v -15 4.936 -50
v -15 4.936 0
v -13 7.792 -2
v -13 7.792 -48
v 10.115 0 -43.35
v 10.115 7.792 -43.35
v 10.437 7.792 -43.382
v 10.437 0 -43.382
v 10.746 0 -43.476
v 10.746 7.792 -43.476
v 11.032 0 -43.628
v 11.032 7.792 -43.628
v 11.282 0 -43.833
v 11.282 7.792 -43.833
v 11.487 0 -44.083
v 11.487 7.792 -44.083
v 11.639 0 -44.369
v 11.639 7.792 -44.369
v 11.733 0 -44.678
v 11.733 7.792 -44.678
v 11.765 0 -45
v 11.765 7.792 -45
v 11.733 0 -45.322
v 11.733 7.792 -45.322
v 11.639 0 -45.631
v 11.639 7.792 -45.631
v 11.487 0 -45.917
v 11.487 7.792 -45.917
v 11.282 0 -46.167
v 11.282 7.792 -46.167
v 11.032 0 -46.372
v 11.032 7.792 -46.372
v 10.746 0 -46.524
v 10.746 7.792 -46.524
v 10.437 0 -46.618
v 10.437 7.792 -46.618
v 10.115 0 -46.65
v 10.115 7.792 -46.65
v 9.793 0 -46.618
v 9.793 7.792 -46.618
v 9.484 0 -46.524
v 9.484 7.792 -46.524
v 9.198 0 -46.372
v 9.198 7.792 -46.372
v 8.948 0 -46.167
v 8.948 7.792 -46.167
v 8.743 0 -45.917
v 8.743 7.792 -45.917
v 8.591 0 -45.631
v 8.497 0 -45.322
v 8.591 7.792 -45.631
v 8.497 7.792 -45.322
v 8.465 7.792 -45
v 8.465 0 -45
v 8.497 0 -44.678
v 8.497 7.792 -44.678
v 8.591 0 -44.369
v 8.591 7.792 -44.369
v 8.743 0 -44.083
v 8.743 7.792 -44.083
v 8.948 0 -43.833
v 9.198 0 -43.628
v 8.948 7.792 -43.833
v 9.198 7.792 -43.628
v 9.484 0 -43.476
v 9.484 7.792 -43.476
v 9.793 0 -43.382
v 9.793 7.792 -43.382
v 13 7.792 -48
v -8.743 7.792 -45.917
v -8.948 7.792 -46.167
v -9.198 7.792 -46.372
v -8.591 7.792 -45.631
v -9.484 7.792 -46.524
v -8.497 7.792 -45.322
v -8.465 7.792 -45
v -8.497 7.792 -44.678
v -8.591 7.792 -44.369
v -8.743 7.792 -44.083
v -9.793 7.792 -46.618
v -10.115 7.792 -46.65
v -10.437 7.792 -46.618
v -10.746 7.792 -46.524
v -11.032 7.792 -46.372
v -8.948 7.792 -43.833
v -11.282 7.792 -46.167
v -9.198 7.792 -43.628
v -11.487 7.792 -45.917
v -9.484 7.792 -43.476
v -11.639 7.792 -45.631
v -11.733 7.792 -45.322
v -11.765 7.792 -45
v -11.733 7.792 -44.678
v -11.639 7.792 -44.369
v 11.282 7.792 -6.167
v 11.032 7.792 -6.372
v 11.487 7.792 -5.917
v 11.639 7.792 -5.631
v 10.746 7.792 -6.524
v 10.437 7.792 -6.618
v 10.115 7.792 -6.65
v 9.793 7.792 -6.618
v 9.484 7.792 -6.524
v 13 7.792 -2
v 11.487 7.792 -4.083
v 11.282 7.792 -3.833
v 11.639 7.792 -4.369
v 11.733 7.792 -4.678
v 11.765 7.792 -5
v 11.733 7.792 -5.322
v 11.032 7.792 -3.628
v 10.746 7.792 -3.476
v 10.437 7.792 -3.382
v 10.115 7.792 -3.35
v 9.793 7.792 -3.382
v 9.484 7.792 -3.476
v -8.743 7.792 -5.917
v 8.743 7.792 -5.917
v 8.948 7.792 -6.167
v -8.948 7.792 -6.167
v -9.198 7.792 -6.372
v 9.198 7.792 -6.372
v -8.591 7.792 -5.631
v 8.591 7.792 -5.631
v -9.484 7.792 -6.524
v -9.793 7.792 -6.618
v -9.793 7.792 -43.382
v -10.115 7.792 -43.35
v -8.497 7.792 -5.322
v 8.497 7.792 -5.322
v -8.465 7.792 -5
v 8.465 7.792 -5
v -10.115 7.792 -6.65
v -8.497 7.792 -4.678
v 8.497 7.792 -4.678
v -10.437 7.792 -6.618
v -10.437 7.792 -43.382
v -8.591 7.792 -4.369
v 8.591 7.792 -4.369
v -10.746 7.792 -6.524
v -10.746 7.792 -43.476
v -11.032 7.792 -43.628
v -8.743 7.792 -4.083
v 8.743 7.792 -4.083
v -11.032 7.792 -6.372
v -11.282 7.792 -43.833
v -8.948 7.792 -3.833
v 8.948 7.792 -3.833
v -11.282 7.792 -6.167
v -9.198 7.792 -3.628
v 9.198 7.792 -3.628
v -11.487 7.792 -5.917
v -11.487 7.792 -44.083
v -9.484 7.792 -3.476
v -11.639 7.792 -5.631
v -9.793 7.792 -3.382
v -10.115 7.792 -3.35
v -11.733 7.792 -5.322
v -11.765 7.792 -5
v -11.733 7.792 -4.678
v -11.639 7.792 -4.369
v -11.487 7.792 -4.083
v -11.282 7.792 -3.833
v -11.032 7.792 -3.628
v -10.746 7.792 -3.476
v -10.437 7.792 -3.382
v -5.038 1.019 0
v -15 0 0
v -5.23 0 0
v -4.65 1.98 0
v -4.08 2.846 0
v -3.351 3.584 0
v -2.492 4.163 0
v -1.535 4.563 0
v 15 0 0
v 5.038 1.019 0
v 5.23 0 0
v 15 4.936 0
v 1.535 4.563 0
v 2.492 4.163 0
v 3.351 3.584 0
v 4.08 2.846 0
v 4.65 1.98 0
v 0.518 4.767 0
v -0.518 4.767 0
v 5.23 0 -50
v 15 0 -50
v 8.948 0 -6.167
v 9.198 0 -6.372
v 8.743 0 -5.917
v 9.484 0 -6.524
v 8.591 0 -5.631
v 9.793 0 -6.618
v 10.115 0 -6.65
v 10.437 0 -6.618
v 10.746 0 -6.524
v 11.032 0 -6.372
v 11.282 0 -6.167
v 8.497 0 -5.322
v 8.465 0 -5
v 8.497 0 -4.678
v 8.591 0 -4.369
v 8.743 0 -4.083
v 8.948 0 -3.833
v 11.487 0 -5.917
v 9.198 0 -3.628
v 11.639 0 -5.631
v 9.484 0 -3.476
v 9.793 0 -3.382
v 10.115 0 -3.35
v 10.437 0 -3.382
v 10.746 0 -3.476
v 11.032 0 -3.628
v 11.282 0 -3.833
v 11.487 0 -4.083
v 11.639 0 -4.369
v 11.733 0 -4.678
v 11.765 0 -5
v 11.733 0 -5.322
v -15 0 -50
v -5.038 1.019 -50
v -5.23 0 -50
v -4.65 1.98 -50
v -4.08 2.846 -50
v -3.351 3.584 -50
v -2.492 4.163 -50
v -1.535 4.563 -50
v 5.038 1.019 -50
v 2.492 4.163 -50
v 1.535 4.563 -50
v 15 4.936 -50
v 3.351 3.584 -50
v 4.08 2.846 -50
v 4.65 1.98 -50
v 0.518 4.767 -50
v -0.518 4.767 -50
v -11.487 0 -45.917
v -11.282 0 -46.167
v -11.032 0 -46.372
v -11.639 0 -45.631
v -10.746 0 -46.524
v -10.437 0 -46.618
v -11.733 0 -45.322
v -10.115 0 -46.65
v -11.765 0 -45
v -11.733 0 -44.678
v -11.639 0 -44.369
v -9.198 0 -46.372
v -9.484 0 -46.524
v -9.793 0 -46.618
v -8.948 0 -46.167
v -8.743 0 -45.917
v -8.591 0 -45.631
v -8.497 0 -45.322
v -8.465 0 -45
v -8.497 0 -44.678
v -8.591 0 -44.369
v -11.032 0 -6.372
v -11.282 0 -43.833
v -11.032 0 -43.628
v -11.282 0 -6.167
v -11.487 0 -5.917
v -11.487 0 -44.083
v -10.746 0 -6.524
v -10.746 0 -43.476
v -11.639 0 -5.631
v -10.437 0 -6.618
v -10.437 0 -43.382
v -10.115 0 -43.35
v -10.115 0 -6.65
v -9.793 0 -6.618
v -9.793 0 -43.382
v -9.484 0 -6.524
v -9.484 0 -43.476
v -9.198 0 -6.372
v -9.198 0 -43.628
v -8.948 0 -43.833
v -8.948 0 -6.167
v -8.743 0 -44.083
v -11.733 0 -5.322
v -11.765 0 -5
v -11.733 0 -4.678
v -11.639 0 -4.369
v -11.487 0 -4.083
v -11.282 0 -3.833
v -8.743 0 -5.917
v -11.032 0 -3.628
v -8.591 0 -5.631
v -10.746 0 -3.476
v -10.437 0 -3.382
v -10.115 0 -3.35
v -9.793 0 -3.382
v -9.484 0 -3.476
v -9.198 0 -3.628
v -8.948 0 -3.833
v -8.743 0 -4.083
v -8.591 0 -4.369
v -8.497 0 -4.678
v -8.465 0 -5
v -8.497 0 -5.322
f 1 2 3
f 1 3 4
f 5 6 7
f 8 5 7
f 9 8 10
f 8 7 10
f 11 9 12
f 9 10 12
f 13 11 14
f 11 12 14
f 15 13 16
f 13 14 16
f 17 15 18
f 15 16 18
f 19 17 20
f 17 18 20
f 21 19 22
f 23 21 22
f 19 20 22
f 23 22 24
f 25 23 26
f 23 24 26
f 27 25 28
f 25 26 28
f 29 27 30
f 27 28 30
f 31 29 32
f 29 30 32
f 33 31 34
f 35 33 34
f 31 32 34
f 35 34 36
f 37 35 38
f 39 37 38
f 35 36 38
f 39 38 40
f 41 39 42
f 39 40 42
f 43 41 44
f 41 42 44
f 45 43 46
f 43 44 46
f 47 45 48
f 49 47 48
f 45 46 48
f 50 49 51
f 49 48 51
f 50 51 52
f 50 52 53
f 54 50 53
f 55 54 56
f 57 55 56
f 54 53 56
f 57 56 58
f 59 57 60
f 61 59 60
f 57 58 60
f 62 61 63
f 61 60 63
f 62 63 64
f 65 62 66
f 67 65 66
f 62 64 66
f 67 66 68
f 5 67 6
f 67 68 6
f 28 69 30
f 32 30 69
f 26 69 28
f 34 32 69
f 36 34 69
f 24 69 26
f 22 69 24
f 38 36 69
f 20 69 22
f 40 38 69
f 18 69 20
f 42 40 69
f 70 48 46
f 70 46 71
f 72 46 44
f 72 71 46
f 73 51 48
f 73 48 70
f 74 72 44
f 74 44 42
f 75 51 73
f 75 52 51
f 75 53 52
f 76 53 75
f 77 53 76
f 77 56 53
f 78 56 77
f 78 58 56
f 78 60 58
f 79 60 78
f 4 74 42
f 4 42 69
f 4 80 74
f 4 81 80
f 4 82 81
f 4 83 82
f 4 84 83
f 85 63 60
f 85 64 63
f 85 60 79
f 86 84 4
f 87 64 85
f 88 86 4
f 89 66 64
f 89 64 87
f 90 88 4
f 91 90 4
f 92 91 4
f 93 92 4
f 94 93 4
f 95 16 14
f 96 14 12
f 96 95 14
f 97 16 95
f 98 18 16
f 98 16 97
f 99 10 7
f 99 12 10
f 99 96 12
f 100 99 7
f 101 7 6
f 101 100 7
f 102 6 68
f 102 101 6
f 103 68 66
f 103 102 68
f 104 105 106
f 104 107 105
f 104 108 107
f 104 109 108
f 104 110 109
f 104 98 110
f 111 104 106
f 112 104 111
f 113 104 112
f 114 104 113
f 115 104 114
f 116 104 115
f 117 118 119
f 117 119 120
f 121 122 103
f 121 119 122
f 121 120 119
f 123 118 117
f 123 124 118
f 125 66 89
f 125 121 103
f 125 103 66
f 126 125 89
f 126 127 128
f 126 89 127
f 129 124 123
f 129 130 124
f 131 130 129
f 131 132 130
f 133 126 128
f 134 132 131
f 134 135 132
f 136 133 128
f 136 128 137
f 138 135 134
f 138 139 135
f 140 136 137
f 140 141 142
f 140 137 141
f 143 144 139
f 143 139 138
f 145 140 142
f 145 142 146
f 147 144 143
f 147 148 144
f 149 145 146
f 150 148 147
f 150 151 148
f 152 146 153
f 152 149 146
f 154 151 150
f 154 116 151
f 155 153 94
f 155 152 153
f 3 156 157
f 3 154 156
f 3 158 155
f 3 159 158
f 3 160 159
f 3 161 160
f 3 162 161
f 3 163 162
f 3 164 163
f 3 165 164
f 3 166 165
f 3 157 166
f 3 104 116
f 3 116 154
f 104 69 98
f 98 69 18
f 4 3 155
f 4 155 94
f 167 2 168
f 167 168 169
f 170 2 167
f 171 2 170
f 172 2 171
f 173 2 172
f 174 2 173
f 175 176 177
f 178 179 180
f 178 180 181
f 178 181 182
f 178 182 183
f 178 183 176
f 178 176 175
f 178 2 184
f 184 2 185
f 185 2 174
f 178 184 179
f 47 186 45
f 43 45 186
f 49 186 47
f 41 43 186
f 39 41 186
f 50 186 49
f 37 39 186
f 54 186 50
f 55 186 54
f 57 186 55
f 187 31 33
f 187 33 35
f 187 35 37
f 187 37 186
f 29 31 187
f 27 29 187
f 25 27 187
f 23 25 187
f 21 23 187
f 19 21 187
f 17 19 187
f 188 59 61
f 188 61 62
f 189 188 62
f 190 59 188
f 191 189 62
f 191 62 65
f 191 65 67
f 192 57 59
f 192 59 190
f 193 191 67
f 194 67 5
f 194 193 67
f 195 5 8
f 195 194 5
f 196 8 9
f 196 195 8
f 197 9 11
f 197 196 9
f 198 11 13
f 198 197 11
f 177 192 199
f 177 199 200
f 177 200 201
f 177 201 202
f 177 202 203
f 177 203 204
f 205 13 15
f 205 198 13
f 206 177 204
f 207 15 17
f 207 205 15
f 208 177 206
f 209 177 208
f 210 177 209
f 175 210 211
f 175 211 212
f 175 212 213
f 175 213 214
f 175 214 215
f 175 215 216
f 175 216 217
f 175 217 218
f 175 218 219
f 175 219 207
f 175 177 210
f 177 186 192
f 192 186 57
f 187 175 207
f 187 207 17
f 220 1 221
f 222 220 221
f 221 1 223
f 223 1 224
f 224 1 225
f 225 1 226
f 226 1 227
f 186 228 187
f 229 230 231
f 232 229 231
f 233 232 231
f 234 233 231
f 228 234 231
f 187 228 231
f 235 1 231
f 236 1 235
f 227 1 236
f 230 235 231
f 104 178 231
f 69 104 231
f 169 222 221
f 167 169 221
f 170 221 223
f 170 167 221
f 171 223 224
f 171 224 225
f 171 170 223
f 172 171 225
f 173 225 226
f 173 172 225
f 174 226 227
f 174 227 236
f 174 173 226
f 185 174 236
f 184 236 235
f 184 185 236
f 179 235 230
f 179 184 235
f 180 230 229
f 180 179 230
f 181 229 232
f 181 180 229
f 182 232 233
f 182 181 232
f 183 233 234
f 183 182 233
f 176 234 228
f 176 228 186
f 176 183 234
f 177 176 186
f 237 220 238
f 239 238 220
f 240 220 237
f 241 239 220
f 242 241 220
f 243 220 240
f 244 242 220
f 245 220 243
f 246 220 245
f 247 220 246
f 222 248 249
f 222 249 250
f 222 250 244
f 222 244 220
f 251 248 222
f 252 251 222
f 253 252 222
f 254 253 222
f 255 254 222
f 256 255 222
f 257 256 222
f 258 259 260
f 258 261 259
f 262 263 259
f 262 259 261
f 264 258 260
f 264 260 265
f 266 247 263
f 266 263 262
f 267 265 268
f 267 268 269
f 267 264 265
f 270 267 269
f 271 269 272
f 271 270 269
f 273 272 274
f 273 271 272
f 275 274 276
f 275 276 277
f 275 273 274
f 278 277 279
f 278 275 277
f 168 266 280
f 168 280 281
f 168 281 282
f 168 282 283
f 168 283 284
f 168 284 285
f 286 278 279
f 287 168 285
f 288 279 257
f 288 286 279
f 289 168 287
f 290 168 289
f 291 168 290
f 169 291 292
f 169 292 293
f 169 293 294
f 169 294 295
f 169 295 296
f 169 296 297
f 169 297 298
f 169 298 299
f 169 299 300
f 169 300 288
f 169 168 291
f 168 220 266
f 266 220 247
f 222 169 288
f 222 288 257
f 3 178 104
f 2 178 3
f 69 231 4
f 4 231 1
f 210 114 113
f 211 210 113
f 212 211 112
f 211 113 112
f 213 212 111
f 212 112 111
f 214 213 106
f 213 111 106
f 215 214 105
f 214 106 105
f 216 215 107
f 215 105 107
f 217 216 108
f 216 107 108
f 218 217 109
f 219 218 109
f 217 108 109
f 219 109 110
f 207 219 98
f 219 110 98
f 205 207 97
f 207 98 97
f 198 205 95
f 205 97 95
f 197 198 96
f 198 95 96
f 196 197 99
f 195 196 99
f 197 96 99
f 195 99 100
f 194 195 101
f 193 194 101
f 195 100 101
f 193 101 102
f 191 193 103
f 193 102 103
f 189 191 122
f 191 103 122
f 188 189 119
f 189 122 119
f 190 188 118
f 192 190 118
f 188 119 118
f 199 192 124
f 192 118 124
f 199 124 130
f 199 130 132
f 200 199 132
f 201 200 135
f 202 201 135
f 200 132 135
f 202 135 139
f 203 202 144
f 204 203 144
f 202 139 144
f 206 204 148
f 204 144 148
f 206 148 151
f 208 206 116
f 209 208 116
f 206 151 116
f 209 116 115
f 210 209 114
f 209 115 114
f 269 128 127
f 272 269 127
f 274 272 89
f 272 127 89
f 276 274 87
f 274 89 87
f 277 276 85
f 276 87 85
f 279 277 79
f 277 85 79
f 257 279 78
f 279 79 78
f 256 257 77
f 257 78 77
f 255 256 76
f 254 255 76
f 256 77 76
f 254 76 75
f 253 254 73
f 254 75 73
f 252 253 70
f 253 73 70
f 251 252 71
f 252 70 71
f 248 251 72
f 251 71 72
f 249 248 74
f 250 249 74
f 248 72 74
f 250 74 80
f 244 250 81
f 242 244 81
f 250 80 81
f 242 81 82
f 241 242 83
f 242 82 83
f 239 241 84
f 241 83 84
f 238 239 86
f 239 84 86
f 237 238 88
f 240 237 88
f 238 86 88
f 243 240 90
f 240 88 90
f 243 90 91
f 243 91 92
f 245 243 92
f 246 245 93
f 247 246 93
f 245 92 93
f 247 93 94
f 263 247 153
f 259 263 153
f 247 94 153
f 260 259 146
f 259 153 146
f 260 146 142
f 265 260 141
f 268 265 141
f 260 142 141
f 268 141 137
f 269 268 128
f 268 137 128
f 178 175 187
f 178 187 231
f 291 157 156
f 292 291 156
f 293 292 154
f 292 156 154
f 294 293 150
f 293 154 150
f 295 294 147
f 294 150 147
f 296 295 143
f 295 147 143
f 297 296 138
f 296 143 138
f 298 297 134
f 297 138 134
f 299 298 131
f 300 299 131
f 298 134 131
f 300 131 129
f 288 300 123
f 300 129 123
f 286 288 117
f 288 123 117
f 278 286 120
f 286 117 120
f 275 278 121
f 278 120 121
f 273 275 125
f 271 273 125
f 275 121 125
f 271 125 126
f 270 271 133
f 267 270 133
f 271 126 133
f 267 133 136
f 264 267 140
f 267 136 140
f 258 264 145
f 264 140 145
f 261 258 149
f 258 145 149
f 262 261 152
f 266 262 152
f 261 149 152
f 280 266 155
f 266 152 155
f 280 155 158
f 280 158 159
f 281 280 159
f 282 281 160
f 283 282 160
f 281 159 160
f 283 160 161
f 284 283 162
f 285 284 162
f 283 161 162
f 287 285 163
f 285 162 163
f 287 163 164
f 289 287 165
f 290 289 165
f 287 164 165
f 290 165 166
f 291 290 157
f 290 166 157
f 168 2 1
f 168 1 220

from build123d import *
from OCP.BRepAlgoAPI import BRepAlgoAPI_Cut
from OCP.TopTools import TopTools_ListOfShape

# Parameters (mm, degrees)
BOSS_EXTRUDE1_DEPTH = 50
SKETCH4_R           = 1.65
CUT_EXTRUDE1_DEPTH  = 7.792432
CHAMFER1_SIZE       = 2
CHAMFER1_SIZE2      = 2.856296013


with BuildPart() as part:
    # Sketch2 → Boss-Extrude1 (new body)
    with BuildSketch(Plane.XY):
        with BuildLine():
            Line((5.230022165, 0), (15, 0))
            Line((15, 0), (15, 7.792432351))
            Line((15, 7.792432351), (-15, 7.792432351))
            Line((-15, 7.792432351), (-15, 0))
            Line((-15, 0), (-5.230022165, 0))
            ThreePointArc((-5.230022165, 0), (0, 4.792432351), (5.230022165, 0))
        make_face()
    extrude(amount=-BOSS_EXTRUDE1_DEPTH)


with BuildPart() as cut_extrude1_tool:
    # Sketch4 → Cut-Extrude1 (new body)
    with BuildSketch(Plane(origin=(0, 7.792432351, 0), x_dir=(1, 0, 0), z_dir=(0, 1, 0))):
        with Locations(Location((-10.115011082, 45, 0), (0, 0, 270))):
            Circle(SKETCH4_R)
        with Locations(Location((-10.115011082, 5, 0), (0, 0, 270))):
            Circle(SKETCH4_R)
        with Locations(Location((10.115011082, 45, 0), (0, 0, 270))):
            Circle(SKETCH4_R)
        with Locations(Location((10.115011082, 5, 0), (0, 0, 270))):
            Circle(SKETCH4_R)
    extrude(amount=-CUT_EXTRUDE1_DEPTH)


with BuildPart() as part_1:
    add(part.part)

    # Cut-Extrude1: cut by cut_extrude1_tool, with a tolerance
    cut_extrude1_stock = TopTools_ListOfShape()
    cut_extrude1_stock.Append(part_1.part.wrapped)
    cut_extrude1_tools = TopTools_ListOfShape()
    cut_extrude1_tools.Append(cut_extrude1_tool.part.wrapped)
    cut_extrude1_cut = BRepAlgoAPI_Cut()
    cut_extrude1_cut.SetArguments(cut_extrude1_stock)
    cut_extrude1_cut.SetTools(cut_extrude1_tools)
    cut_extrude1_cut.SetFuzzyValue(0.00001)
    cut_extrude1_cut.Build()
    add(Compound.cast(cut_extrude1_cut.Shape()).solids(), mode=Mode.REPLACE)

    # Chamfer1
    chamfer1_edges = [part_1.edges().sort_by_distance(p)[0] for p in [
        (0, 7.792432351, 0),
        (15, 7.792432351, -25),
        (0, 7.792432351, -50),
        (-15, 7.792432351, -25),
    ]]
    chamfer1_side = [part_1.faces().sort_by_distance(p)[0] for p in [
        (0, 7.792432351, -25),
    ]]
    chamfer(chamfer1_edges, length=CHAMFER1_SIZE, length2=CHAMFER1_SIZE2, reference=chamfer1_side[0])


solid = part_1.part
